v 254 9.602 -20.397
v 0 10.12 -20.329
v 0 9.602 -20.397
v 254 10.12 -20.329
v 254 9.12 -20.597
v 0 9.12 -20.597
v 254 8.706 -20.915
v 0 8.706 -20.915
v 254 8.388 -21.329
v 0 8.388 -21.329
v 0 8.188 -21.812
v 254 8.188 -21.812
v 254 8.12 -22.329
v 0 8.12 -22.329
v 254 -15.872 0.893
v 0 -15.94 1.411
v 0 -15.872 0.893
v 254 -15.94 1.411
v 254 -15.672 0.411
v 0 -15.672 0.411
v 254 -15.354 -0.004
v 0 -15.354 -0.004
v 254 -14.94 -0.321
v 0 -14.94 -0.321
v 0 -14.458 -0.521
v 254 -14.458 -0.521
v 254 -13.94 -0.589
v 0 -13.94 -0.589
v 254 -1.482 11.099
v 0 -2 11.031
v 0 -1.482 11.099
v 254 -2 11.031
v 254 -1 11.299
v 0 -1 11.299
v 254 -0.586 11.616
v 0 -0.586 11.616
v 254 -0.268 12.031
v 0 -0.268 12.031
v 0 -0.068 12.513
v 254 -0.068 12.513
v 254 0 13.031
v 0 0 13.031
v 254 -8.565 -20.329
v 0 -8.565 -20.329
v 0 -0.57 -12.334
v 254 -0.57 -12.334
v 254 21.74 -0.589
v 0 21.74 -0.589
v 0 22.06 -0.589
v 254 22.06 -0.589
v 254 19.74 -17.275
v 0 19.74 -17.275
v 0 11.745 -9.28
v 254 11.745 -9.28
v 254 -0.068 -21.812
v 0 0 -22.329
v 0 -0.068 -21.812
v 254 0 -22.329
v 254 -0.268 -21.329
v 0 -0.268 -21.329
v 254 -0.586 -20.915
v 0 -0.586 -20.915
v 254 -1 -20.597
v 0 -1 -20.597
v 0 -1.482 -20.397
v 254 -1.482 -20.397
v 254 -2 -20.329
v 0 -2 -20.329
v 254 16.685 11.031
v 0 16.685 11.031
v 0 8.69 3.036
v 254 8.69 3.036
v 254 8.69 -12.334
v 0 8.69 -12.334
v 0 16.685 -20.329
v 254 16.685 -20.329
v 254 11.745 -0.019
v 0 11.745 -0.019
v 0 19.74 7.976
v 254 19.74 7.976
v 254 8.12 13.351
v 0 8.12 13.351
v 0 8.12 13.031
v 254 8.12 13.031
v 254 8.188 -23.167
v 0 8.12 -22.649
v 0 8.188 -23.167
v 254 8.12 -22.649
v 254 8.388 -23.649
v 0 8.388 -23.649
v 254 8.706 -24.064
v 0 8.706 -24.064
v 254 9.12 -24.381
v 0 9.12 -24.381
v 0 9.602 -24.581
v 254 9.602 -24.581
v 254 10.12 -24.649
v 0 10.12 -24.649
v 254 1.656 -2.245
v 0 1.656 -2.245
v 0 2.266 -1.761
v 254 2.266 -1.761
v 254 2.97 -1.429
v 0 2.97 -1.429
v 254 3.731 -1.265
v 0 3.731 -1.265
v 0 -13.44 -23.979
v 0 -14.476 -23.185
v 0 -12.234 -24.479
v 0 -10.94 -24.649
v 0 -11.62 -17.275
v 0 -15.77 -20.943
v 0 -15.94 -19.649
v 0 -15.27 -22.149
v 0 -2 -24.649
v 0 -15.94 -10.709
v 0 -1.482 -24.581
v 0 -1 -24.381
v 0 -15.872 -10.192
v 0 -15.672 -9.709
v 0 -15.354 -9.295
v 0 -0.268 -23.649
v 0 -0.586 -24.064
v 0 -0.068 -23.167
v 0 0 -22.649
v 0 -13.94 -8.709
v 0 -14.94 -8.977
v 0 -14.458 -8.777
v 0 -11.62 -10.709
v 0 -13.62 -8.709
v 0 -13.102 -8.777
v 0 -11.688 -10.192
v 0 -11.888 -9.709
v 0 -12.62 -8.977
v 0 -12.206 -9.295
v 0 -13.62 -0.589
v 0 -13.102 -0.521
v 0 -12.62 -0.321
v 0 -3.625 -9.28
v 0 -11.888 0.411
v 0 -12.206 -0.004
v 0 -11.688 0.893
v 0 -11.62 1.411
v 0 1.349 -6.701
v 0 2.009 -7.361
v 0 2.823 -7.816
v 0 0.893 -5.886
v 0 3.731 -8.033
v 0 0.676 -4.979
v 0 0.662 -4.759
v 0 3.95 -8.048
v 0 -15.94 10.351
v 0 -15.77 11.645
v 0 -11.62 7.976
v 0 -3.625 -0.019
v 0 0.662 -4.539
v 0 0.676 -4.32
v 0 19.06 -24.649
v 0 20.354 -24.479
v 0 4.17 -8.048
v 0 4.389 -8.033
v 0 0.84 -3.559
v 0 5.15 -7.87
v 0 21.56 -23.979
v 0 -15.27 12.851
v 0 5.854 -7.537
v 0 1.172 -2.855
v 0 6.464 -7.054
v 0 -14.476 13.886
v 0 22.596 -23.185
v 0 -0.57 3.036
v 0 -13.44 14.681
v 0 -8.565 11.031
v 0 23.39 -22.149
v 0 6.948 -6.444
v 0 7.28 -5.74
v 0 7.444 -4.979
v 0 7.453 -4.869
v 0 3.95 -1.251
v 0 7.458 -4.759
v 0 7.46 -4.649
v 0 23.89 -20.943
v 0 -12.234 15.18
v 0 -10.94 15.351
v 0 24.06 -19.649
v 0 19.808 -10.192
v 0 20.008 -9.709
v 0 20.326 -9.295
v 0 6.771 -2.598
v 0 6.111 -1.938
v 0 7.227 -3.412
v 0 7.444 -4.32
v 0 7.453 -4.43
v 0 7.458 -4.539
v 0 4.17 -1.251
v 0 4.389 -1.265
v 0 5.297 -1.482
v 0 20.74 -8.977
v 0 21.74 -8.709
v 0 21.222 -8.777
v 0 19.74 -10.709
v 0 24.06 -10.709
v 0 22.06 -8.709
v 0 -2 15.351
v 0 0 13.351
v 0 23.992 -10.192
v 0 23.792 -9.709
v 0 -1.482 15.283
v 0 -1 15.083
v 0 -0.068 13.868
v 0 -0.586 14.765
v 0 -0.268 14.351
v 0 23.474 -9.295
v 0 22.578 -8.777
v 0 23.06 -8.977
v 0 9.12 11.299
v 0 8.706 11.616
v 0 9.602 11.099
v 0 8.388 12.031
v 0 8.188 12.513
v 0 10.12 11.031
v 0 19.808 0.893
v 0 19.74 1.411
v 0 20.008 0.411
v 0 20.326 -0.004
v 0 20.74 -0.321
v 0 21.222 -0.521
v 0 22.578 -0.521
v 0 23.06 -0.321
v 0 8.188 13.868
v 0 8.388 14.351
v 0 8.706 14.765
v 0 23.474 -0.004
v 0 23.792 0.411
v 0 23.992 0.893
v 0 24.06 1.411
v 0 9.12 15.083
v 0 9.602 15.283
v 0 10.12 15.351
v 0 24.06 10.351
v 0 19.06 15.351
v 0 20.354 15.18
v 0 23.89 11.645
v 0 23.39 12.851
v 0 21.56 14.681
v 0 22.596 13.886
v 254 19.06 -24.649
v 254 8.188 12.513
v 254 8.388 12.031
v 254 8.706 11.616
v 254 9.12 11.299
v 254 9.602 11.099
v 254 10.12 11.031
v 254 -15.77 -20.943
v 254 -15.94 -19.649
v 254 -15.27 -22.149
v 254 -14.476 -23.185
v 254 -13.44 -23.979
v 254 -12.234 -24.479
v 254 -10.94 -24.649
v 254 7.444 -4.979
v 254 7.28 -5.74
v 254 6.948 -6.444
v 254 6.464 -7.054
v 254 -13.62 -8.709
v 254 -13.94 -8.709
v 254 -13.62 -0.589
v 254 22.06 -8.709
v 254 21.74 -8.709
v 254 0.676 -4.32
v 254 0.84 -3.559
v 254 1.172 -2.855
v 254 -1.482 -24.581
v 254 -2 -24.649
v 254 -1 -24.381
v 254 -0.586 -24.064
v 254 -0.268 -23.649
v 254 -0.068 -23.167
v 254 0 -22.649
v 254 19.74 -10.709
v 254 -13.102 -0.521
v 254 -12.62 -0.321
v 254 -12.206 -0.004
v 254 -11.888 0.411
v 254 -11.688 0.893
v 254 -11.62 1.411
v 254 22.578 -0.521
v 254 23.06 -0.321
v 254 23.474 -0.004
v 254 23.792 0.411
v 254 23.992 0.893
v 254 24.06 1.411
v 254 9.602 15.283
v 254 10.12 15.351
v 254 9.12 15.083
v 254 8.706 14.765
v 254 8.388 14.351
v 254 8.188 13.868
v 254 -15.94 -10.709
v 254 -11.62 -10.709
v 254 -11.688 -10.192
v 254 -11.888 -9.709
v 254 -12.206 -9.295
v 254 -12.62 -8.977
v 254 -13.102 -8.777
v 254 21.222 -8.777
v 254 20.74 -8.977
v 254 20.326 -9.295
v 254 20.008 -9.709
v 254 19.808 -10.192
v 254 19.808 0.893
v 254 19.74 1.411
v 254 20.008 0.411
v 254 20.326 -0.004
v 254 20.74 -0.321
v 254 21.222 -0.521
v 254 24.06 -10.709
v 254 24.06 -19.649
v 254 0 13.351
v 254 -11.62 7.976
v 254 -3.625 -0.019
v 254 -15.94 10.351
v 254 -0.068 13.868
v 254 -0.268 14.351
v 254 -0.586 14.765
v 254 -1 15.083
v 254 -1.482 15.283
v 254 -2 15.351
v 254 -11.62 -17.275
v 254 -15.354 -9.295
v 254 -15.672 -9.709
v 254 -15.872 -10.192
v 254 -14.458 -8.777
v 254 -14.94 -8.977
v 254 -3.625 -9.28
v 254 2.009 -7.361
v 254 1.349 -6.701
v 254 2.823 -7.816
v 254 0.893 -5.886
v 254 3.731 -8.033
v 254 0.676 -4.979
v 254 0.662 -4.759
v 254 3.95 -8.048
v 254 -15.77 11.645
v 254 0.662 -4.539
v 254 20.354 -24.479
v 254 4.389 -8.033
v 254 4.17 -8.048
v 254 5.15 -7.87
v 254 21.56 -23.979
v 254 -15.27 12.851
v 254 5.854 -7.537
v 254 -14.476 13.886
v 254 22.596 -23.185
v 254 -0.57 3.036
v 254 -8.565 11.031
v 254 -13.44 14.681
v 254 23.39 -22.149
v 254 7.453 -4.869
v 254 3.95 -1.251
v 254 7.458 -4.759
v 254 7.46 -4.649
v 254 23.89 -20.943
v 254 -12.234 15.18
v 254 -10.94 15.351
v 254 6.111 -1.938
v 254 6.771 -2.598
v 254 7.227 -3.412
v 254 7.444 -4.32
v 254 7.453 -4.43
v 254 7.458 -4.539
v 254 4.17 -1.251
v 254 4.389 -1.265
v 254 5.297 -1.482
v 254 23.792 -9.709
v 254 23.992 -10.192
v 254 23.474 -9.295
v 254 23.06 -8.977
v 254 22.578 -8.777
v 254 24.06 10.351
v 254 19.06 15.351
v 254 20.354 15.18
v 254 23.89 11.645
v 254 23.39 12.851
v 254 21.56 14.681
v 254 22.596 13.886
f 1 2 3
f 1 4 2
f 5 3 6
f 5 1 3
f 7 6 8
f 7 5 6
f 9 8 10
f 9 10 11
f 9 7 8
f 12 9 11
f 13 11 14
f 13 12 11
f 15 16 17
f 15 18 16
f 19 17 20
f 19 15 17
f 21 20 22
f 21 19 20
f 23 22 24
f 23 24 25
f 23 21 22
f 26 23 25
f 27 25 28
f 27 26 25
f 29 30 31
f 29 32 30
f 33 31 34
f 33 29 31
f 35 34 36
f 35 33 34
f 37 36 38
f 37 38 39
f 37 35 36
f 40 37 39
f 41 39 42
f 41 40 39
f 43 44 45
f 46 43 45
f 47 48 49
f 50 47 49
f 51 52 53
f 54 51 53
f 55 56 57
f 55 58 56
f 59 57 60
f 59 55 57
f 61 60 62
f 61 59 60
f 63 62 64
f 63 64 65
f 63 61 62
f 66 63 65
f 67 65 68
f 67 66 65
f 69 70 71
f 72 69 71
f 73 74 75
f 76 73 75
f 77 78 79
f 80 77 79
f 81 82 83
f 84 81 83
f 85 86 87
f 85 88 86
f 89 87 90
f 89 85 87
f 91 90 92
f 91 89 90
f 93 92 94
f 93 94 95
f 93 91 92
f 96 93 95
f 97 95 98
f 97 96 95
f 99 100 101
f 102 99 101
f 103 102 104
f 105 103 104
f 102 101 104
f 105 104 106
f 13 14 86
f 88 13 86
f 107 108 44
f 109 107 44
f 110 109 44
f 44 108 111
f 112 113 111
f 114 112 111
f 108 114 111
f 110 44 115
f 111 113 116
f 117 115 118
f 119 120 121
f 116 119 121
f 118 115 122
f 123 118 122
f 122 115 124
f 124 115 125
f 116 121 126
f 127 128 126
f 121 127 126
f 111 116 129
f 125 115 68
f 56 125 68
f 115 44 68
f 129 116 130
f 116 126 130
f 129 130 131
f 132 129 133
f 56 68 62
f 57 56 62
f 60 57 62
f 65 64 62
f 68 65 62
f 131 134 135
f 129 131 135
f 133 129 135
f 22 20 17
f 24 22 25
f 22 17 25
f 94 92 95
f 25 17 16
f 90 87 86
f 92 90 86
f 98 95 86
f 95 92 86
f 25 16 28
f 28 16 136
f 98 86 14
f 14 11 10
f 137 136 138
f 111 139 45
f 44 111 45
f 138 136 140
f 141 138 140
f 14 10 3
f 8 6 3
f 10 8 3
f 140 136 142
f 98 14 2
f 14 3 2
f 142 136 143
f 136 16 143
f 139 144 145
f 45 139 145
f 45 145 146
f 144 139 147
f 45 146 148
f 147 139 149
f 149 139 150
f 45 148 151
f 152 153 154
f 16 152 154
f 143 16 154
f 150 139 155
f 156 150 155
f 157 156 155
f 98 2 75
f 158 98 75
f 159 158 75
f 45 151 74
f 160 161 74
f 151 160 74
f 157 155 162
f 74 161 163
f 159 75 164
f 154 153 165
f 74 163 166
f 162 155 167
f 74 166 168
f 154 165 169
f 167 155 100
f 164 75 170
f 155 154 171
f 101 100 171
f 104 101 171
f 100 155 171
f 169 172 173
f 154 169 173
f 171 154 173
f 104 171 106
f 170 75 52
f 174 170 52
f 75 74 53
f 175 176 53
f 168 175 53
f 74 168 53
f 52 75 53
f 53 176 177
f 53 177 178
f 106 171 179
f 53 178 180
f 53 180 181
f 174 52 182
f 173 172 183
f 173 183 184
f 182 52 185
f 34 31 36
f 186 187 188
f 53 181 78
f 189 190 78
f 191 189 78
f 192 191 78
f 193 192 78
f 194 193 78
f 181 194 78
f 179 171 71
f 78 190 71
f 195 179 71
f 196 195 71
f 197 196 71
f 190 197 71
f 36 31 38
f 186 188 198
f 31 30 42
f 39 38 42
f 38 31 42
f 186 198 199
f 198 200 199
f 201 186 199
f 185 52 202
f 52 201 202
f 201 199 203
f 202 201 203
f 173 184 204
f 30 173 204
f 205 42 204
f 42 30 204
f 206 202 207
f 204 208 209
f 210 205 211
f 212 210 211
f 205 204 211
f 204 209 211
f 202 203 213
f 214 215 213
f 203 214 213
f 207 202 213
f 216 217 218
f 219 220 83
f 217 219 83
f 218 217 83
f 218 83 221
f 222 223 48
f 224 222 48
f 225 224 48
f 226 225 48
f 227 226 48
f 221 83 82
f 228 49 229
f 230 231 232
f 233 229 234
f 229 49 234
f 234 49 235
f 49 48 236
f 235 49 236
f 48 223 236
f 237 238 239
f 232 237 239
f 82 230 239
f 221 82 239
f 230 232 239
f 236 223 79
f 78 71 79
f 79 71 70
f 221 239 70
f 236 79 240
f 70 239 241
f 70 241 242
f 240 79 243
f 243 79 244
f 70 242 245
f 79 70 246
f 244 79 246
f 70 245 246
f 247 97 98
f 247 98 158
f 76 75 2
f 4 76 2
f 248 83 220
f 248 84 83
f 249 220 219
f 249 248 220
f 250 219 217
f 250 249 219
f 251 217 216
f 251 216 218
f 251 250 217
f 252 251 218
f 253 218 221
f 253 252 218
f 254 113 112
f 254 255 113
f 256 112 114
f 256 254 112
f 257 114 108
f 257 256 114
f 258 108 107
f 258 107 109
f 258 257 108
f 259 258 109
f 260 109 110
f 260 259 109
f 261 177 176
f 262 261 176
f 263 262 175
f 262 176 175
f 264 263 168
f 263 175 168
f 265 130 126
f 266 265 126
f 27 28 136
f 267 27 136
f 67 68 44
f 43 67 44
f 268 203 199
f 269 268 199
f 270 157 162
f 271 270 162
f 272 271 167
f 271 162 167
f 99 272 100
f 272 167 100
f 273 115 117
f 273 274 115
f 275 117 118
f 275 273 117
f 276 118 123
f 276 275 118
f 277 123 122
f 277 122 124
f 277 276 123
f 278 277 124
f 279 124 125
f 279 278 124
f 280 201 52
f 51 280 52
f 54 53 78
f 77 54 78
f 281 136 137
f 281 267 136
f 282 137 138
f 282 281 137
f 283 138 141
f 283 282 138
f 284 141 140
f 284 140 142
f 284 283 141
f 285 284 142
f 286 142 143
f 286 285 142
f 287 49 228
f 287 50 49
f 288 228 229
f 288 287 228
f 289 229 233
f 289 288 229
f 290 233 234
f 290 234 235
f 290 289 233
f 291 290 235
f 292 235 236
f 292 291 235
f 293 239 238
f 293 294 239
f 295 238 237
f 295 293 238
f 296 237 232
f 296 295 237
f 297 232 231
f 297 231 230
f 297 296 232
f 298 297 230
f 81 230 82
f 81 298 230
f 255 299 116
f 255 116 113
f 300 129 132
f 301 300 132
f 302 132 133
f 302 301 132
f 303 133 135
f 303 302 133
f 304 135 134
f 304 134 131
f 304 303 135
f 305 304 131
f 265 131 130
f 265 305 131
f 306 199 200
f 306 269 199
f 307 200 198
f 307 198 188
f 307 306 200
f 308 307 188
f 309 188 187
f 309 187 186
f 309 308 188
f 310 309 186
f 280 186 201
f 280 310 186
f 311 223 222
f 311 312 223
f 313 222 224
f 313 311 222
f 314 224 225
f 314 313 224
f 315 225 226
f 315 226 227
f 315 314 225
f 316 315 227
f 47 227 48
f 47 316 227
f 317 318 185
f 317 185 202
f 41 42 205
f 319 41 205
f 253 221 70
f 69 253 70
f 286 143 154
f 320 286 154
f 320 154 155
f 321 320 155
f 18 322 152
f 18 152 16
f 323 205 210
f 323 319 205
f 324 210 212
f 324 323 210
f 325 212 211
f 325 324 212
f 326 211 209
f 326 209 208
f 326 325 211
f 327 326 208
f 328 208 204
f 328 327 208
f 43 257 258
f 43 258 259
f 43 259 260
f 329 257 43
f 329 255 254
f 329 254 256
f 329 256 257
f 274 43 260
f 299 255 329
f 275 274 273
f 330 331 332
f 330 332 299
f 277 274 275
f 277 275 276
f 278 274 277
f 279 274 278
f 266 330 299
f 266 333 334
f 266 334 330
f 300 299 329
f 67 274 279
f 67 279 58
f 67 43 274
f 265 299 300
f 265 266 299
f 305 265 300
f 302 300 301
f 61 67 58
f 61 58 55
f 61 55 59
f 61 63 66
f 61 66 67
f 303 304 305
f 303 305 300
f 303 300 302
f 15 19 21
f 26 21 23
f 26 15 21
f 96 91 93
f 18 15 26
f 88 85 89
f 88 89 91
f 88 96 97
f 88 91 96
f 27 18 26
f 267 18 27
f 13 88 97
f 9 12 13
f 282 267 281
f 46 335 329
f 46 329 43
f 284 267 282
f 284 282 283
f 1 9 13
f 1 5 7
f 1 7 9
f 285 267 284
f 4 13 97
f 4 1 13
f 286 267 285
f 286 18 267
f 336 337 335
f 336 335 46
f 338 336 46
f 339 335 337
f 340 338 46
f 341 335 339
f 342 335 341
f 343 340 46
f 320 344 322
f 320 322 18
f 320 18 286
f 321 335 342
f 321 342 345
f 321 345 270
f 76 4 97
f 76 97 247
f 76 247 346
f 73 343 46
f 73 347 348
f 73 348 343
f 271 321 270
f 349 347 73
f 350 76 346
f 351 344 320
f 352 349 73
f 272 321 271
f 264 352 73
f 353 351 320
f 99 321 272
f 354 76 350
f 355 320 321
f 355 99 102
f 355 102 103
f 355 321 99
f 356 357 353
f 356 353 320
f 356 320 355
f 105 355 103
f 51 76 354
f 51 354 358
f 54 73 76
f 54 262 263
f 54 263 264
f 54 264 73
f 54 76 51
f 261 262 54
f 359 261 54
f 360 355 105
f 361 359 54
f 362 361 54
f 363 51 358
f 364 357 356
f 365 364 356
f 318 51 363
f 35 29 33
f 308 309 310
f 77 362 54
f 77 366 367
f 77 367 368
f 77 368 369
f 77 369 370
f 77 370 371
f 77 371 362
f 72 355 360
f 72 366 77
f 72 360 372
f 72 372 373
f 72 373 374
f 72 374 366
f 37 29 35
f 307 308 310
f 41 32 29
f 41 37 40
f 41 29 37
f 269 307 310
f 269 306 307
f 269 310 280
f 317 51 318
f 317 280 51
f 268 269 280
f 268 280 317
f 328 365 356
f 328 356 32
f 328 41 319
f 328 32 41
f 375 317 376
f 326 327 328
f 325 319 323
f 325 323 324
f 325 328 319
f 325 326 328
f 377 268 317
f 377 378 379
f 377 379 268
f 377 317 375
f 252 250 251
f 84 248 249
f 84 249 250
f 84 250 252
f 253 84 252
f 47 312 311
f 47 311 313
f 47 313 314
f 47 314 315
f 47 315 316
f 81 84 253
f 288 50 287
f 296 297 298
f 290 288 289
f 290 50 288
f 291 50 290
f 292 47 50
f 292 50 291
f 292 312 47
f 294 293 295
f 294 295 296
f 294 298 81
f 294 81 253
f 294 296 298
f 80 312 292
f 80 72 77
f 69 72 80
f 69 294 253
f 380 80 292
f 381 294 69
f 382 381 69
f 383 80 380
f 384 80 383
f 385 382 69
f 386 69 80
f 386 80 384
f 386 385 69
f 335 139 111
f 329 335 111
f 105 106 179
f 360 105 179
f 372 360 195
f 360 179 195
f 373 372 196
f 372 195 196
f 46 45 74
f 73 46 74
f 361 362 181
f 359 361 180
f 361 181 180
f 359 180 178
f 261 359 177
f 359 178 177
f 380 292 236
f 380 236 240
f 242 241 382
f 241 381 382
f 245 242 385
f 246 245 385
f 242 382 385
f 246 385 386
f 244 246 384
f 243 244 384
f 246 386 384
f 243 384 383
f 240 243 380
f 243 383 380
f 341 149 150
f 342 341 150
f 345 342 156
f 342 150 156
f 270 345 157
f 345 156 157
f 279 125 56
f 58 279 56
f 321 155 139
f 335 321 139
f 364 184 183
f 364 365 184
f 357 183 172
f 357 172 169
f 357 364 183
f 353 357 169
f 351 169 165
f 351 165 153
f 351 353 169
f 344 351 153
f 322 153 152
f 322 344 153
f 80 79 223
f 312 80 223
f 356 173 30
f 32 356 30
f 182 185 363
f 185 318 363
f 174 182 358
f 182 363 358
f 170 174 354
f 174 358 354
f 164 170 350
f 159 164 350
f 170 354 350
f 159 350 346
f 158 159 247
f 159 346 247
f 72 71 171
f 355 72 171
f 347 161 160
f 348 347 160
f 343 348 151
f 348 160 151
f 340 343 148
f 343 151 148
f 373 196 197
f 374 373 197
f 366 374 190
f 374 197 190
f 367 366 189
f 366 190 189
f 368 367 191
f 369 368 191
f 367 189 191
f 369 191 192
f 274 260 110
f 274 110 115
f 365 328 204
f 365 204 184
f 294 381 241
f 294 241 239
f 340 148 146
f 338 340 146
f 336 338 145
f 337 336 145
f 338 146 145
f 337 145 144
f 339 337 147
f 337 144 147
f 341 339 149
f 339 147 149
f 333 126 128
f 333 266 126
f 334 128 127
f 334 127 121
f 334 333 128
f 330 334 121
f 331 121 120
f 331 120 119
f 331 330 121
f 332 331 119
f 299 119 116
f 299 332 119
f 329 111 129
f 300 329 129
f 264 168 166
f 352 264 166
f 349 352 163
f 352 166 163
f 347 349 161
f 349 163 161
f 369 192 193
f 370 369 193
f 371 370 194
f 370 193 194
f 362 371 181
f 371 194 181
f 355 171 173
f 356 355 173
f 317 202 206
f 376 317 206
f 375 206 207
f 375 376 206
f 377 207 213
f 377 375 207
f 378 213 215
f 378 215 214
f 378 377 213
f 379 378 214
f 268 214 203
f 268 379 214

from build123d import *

# Parameters (mm, degrees)
F1_DEPTH = 254
F2_R     = 2
F3_R     = 5


with BuildPart() as f1:
    # F0 (on Right) → F1 (new body)
    with BuildSketch(Plane.YZ):
        Polygon((-11.62, 7.9759603159), (-15.94, 12.2959603159), (-15.94, -0.5893383893), (-11.62, -0.5893383893), align=None)
        Polygon((-11.62, 11.0306616107), (-15.94, 15.3506616107), (-15.94, 12.2959603159), (-11.62, 7.9759603159), (-8.7938307864, 5.1497911023), (-7.266480139, 6.6771417497), align=None)
        Polygon((-8.5652987053, 11.0306616107), (-11.62, 11.0306616107), (-7.266480139, 6.6771417497), (-5.7391294917, 8.2044923971), align=None)
        Polygon((0, 15.3506616107), (-12.8852987053, 15.3506616107), (-8.5652987053, 11.0306616107), (0, 11.0306616107), align=None)
        Polygon((-12.8852987053, 15.3506616107), (-15.94, 15.3506616107), (-11.62, 11.0306616107), (-8.5652987053, 11.0306616107), align=None)
        Polygon((-15.94, -21.5946370946), (-11.62, -17.2746370946), (-11.62, -8.7093383893), (-15.94, -8.7093383893), align=None)
        Polygon((-3.625, -12.3343383893), (-3.625, -9.2796370946), (-11.62, -17.2746370946), (-15.94, -21.5946370946), (-15.94, -24.6493383893), (-12.8852987053, -24.6493383893), (-8.5652987053, -20.3293383893), (-0.5702987053, -12.3343383893), align=None)
        Polygon((0, -20.3293383893), (-8.5652987053, -20.3293383893), (-12.8852987053, -24.6493383893), (0, -24.6493383893), align=None)
        Polygon((14.9650698751, 9.3104327805), (8.6902987053, 3.0356616107), (11.745, 3.0356616107), (11.745, -0.0190396841), (18.0197711699, 6.2557314858), (19.74, 7.9759603159), (16.6852987053, 11.0306616107), align=None)
        Polygon((21.0052987053, 15.3506616107), (16.6852987053, 11.0306616107), (19.74, 7.9759603159), (24.06, 12.2959603159), (24.06, 15.3506616107), align=None)
        Polygon((24.06, 12.2959603159), (19.74, 7.9759603159), (19.74, -0.5893383893), (24.06, -0.5893383893), align=None)
        Polygon((8.12, 11.0306616107), (16.6852987053, 11.0306616107), (21.0052987053, 15.3506616107), (8.12, 15.3506616107), align=None)
        with BuildLine():
            Line((11.745, -9.2796370946), (11.745, -0.0190396841))
            Line((11.745, -0.0190396841), (7.4440143218, -4.3200253623))
            ThreePointArc((7.4440143218, -4.3200253623), (7.456001229, -4.4844879937), (7.46, -4.6493383893))
            ThreePointArc((7.46, -4.6493383893), (7.456001229, -4.8141887849), (7.4440143218, -4.9786514164))
            Line((7.4440143218, -4.9786514164), (11.745, -9.2796370946))
        make_face()
        with BuildLine():
            Line((3.7306869729, -8.0333527111), (-0.5702987053, -12.3343383893))
            Line((-0.5702987053, -12.3343383893), (8.6902987053, -12.3343383893))
            Line((8.6902987053, -12.3343383893), (4.3893130271, -8.0333527111))
            ThreePointArc((4.3893130271, -8.0333527111), (4.06, -8.0493383893), (3.7306869729, -8.0333527111))
        make_face()
        with BuildLine():
            Line((0.6759856782, -4.3200253623), (-3.625, -0.0190396841))
            Line((-3.625, -0.0190396841), (-3.625, -9.2796370946))
            Line((-3.625, -9.2796370946), (0.6759856782, -4.9786514164))
            ThreePointArc((0.6759856782, -4.9786514164), (0.66, -4.6493383893), (0.6759856782, -4.3200253623))
        make_face()
        with BuildLine():
            Line((8.6902987053, 3.0356616107), (-0.5702987053, 3.0356616107))
            Line((-0.5702987053, 3.0356616107), (3.7306869729, -1.2653240675))
            ThreePointArc((3.7306869729, -1.2653240675), (4.06, -1.2493383893), (4.3893130271, -1.2653240675))
            Line((4.3893130271, -1.2653240675), (8.6902987053, 3.0356616107))
        make_face()
        Polygon((-5.7391294917, 8.2044923971), (-7.266480139, 6.6771417497), (-3.625, 3.0356616107), (-0.5702987053, 3.0356616107), align=None)
        Polygon((-3.625, 3.0356616107), (-7.266480139, 6.6771417497), (-8.7938307864, 5.1497911023), (-3.625, -0.0190396841), align=None)
        Polygon((11.745, -12.3343383893), (8.6902987053, -12.3343383893), (16.6852987053, -20.3293383893), (21.0052987053, -24.6493383893), (24.06, -24.6493383893), align=None)
        Polygon((19.74, -17.2746370946), (11.745, -9.2796370946), (11.745, -12.3343383893), (24.06, -24.6493383893), (24.06, -21.5946370946), align=None)
        Polygon((19.74, -8.7093383893), (19.74, -17.2746370946), (24.06, -21.5946370946), (24.06, -8.7093383893), align=None)
        Polygon((21.0052987053, -24.6493383893), (16.6852987053, -20.3293383893), (8.12, -20.3293383893), (8.12, -24.6493383893), align=None)
        with BuildLine():
            Line((11.745, 3.0356616107), (8.6902987053, 3.0356616107))
            Line((8.6902987053, 3.0356616107), (4.3893130271, -1.2653240675))
            ThreePointArc((4.3893130271, -1.2653240675), (6.464163056, -2.2451753333), (7.4440143218, -4.3200253623))
            Line((7.4440143218, -4.3200253623), (11.745, -0.0190396841))
            Line((11.745, -0.0190396841), (11.745, 3.0356616107))
        make_face()
        with BuildLine():
            Line((1.655836944, -2.2451753333), (-3.625, 3.0356616107))
            Line((-3.625, 3.0356616107), (-3.625, -0.0190396841))
            Line((-3.625, -0.0190396841), (0.6759856782, -4.3200253623))
            ThreePointArc((0.6759856782, -4.3200253623), (0.9855894874, -3.1974430763), (1.655836944, -2.2451753333))
        make_face()
        with BuildLine():
            Line((0.6759856782, -4.9786514164), (-3.625, -9.2796370946))
            Line((-3.625, -9.2796370946), (-3.625, -12.3343383893))
            Line((-3.625, -12.3343383893), (-0.5702987053, -12.3343383893))
            Line((-0.5702987053, -12.3343383893), (3.7306869729, -8.0333527111))
            ThreePointArc((3.7306869729, -8.0333527111), (1.655836944, -7.0535014454), (0.6759856782, -4.9786514164))
        make_face()
        with BuildLine():
            Line((11.745, -12.3343383893), (6.464163056, -7.0535014454))
            ThreePointArc((6.464163056, -7.0535014454), (5.511895313, -7.7237489019), (4.3893130271, -8.0333527111))
            Line((4.3893130271, -8.0333527111), (8.6902987053, -12.3343383893))
            Line((8.6902987053, -12.3343383893), (11.745, -12.3343383893))
        make_face()
        with BuildLine():
            ThreePointArc((7.4440143218, -4.9786514164), (7.1344105126, -6.1012337024), (6.464163056, -7.0535014454))
            Line((6.464163056, -7.0535014454), (11.745, -12.3343383893))
            Line((11.745, -12.3343383893), (11.745, -9.2796370946))
            Line((11.745, -9.2796370946), (7.4440143218, -4.9786514164))
        make_face()
        with BuildLine():
            Line((-0.5702987053, 3.0356616107), (-3.625, 3.0356616107))
            Line((-3.625, 3.0356616107), (1.655836944, -2.2451753333))
            ThreePointArc((1.655836944, -2.2451753333), (2.608104687, -1.5749278767), (3.7306869729, -1.2653240675))
            Line((3.7306869729, -1.2653240675), (-0.5702987053, 3.0356616107))
        make_face()
    extrude(amount=F1_DEPTH)

    # F2
    f2_edges = [f1.edges().sort_by_distance(p)[0] for p in [
        (127, 0, 11.030662),
        (127, -11.62, -0.589338),
        (127, -15.94, -0.589338),
        (127, 0, 15.350662),
        (127, 8.12, 11.030662),
        (127, 19.74, -0.589338),
        (127, 24.06, -0.589338),
        (127, 8.12, -24.649338),
        (127, 8.12, 15.350662),
        (127, -15.94, -8.709338),
        (127, -11.62, -8.709338),
        (127, 0, -24.649338),
        (127, 0, -20.329338),
        (127, 8.12, -20.329338),
        (127, 19.74, -8.709338),
        (127, 24.06, -8.709338),
    ]]
    fillet(f2_edges, radius=F2_R)

    # F3
    f3_edges = [f1.edges().sort_by_distance(p)[0] for p in [
        (127, -15.94, 15.350662),
        (127, 24.06, 15.350662),
        (127, 24.06, -24.649338),
        (127, -15.94, -24.649338),
    ]]
    fillet(f3_edges, radius=F3_R)


solid = f1.part
